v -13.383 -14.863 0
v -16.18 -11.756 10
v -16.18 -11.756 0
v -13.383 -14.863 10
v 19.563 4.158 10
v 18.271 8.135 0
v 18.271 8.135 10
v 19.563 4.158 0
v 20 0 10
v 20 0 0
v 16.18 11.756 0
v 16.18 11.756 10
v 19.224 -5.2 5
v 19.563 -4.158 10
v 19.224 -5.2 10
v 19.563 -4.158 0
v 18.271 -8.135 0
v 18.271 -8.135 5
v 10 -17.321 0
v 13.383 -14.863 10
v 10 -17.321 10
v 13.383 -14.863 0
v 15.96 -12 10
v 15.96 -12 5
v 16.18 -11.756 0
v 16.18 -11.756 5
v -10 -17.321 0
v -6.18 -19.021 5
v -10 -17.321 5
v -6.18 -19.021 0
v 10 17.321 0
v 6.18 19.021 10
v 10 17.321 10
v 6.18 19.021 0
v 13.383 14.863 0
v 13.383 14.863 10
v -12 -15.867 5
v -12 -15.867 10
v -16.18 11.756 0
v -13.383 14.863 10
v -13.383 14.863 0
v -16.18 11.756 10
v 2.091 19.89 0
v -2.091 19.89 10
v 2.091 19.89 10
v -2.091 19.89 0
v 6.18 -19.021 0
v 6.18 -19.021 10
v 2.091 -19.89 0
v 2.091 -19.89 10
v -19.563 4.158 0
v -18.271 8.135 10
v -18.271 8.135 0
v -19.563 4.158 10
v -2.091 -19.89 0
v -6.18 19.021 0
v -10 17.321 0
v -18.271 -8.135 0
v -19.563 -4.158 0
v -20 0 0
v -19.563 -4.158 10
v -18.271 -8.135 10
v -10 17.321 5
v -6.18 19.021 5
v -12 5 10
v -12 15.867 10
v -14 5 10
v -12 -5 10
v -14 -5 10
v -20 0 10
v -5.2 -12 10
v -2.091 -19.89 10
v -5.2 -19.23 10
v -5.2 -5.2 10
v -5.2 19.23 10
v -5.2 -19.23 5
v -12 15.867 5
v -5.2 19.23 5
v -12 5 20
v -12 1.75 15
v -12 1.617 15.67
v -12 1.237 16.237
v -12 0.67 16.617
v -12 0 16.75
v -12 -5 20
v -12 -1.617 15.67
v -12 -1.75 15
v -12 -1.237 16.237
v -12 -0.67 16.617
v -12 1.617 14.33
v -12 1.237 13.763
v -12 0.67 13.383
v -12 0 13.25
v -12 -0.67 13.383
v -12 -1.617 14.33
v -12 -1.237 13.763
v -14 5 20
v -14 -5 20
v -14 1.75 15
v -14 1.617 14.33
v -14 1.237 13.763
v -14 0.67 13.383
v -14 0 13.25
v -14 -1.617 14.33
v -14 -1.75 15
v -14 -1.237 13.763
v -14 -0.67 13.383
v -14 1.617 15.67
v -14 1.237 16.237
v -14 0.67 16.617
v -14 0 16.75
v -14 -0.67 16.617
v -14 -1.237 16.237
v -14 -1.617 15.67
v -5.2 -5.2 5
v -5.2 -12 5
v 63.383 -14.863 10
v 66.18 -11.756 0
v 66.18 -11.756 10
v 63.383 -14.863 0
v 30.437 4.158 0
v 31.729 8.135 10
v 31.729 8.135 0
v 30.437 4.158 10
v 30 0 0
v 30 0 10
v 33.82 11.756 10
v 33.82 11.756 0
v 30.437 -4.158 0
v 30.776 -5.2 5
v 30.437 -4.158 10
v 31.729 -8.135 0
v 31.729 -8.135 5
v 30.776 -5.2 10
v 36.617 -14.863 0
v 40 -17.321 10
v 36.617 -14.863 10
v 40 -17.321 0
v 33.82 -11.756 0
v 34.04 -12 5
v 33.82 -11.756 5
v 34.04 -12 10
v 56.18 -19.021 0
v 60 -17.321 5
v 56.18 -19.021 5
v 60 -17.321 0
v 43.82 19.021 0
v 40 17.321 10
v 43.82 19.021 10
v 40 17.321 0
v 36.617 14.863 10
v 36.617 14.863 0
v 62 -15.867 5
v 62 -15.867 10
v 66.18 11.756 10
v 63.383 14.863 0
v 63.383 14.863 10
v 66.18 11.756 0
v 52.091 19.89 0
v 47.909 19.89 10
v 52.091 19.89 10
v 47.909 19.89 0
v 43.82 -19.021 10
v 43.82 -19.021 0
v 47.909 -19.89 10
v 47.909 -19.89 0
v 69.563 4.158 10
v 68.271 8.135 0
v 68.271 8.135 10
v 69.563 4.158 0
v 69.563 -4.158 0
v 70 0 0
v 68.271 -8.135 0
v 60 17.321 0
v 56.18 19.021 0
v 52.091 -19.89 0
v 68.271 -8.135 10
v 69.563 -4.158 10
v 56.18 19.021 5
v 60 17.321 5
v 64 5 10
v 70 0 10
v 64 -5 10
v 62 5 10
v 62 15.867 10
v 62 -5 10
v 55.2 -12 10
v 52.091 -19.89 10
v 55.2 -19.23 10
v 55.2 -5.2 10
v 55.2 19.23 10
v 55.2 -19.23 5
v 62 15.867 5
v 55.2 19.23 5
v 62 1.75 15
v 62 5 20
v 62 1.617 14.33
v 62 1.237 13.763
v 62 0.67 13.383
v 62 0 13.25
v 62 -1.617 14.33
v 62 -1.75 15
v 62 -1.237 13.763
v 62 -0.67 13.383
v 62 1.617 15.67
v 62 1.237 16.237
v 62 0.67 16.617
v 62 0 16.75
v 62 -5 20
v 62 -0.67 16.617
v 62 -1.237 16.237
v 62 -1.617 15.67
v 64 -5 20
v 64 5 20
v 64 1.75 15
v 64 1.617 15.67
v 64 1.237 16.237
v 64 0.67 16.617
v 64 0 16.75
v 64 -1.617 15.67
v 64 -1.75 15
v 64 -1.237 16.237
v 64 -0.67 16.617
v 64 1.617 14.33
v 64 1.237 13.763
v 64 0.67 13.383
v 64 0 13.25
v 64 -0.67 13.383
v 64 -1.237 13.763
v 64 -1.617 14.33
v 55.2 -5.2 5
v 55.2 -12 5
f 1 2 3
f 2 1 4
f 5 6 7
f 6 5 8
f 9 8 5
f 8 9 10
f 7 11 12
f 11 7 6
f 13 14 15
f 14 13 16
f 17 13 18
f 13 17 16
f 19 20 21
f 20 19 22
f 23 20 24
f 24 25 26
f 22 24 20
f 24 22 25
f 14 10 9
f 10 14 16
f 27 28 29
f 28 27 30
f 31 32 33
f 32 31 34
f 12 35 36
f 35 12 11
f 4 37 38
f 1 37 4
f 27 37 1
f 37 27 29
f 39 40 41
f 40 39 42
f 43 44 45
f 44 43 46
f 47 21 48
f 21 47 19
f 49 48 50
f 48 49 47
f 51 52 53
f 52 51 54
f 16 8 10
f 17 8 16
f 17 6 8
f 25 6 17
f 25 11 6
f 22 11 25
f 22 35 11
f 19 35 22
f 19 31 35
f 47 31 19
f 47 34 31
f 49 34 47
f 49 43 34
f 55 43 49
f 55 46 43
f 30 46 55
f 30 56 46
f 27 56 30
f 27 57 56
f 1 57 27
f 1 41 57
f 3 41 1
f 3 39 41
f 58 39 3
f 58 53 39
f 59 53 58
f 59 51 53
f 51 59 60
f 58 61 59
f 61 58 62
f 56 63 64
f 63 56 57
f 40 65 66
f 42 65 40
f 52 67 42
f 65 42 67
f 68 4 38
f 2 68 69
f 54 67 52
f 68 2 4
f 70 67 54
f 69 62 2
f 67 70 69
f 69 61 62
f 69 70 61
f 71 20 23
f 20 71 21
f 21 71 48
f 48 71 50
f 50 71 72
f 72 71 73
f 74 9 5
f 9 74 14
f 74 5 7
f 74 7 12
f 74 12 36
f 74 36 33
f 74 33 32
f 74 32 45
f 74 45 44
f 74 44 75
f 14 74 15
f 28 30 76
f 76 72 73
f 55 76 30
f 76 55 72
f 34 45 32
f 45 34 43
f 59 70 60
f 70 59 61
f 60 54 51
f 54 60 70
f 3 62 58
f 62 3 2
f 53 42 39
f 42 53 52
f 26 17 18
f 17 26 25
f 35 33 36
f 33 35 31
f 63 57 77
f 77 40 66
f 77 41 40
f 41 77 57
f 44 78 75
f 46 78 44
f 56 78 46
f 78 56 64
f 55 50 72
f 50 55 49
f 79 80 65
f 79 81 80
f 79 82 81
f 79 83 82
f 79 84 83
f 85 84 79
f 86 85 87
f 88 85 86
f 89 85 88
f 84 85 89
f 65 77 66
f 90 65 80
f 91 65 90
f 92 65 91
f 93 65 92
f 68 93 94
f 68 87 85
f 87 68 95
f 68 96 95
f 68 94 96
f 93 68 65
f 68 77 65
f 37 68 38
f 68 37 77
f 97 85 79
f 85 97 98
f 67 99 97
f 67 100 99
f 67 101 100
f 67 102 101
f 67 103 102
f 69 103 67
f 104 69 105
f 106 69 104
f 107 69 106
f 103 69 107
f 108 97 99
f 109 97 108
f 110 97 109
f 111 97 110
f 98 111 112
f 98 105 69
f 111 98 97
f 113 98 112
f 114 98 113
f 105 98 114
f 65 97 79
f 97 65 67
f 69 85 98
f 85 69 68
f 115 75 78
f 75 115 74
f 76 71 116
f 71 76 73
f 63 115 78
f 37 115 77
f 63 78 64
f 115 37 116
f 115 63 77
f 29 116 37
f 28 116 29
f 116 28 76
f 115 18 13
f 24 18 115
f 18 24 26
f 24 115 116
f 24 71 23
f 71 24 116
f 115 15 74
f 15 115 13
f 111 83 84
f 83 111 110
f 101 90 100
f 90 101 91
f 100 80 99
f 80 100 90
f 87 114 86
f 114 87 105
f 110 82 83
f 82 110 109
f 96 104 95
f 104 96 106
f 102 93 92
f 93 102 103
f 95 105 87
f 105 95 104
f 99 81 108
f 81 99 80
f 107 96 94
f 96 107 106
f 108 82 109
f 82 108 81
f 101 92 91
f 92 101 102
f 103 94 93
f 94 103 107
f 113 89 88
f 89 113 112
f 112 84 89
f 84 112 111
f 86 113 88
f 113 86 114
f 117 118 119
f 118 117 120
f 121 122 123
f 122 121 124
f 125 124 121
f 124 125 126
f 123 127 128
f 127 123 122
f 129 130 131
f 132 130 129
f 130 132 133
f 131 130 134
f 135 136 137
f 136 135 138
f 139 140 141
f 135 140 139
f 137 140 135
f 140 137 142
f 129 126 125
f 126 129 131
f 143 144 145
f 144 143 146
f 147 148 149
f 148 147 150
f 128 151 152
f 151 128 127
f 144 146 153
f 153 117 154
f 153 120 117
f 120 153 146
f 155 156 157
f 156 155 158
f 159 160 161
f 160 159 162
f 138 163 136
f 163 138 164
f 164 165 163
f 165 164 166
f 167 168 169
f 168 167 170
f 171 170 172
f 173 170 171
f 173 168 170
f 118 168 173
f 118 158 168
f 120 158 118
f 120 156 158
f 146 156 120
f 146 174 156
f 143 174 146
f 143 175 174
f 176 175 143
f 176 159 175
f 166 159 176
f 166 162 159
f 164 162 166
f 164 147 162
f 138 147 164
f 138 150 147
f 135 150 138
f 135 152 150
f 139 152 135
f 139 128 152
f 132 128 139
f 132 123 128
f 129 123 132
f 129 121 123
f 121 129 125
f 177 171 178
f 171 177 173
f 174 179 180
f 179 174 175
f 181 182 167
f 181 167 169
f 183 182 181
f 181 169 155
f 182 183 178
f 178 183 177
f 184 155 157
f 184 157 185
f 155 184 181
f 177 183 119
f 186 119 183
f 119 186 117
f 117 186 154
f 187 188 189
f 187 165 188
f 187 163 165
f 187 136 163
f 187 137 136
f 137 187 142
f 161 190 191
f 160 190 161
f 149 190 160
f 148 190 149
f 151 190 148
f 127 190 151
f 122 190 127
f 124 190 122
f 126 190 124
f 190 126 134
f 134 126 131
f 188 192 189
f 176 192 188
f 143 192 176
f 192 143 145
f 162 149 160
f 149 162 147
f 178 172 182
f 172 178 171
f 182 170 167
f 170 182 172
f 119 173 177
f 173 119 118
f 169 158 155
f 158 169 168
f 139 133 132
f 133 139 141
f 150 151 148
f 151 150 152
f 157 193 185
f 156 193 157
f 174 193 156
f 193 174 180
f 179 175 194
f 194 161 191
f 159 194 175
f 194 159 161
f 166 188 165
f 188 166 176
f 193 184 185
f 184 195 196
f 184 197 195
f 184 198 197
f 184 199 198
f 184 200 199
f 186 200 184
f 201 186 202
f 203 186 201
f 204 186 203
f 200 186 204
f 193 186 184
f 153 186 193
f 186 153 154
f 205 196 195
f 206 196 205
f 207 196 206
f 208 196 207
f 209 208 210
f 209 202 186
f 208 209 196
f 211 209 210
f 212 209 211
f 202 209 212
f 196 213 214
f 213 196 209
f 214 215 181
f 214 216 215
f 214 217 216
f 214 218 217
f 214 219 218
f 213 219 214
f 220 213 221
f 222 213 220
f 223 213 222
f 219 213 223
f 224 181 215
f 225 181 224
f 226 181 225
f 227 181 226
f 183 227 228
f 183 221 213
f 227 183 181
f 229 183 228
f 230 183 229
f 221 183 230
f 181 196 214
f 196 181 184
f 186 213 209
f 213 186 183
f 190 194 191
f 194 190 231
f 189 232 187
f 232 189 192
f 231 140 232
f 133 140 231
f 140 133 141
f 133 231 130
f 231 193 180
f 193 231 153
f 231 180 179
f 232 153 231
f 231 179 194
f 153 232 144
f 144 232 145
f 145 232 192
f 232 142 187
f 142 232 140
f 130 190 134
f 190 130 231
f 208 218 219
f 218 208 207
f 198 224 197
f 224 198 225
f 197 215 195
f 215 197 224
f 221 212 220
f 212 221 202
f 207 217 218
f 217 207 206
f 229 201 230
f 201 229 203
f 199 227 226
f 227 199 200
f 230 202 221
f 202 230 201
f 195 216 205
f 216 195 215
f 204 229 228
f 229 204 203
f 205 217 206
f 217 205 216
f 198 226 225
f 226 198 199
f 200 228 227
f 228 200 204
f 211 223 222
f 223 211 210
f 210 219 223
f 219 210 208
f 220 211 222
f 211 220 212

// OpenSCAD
// file: ../config.scad
r4 = 2.2;
r8 = 4.2;
r10 = 5.2;

layer_height = 0.25;

switch_d = 9.6;

nema17_r_vis = 15.5;
nema17_r_centre = 11.5;
nema17_h_centre = 2;
nema17_h = 43;
nema17_l = 40;

boite_ui_largeur = 28.5;
boite_ui_l = 46;

support_laser = 24;

r3 = 1.75;
r3_2d = 1.5;
r3_vis = 1.65;
r3_head = 3.6;
m3_r = r3;
m3_nut_d = 7;
m3_nut_d2 = 6.2;
m3_nut_h = 3;

m4_nut_d = 8;
m4_nut_d2 = 7;
m4_nut_h = 4;

608_r = 23/2;
608_h = 8;

laser_printer_l = 609;
laser_printer_lg = 456;

module support_nut(d=3, l_screw1 = 20, l_screw2 = 20, l_nut = 20, h_screw2 = -0.1){
    if(d==3){
        screw_r = r3;
        nut_r = m3_nut_d/2;
        nut_h = m3_nut_h;
        cylinder(nut_h, r = nut_r, $fn = 6, center = true);
        translate([0, 0, -l_screw1])cylinder(l_screw1 +1, r = screw_r);
        translate([0, 0, m3_nut_h/2+ h_screw2])cylinder(l_screw2, r = screw_r);
        l = m3_nut_d*cos(30);
        translate([0, -l/2, -nut_h/2]) cube([l_nut, l,nut_h]);
    } else if(d==4){
        screw_r = r4;
        nut_r = m4_nut_d/2;
        nut_h = m4_nut_h;
        cylinder(nut_h, r = nut_r, $fn = 6, center = true);
        translate([0, 0, -l_screw1])cylinder(l_screw1 +1, r = screw_r);
        translate([0, 0, m4_nut_h/2+ h_screw2])cylinder(l_screw2, r = screw_r);
        l = m4_nut_d*cos(30);
        translate([0, -l/2, -nut_h/2]) cube([l_nut, l,nut_h]);
    }
}


module nut(d=3, center = false){
    nut_r = m3_nut_d/2;
    nut_h = m3_nut_h;
    if(d==3){
        nut_r = m3_nut_d/2;
        nut_h = m3_nut_h;
    } 
    cylinder(nut_h, r = nut_r, $fn = 6, center = center);
}



module m3(h, nut = false, head = false){
    cylinder(h, m3_r, m3_r, $fn=16);
    if(nut){
        cylinder(m3_nut_h, r = m3_nut_d/2, $fn = 6);
    }
}

module m3_nut(h){
    cylinder(m3_nut_h, r = m3_nut_d/2, $fn = 6);
    translate([0, -m3_nut_d2/2, 0]) cube([h, m3_nut_d2, m3_nut_h]);
}

m4_r = 2.3;
m4_nut_d = 8.4;
m4_nut_d2 = 7.5;
m4_nut_h = 3.5;
module m4(h, nut = false, head = false){
    cylinder(h, m4_r, m4_r);
    if(nut){
        cylinder(m4_nut_h, r = m4_nut_d/2, $fn = 6);
    }
}

module m5(h, nut = false, head = false){
    cylinder(h, r = 2.7);
}

m8_nut_d = 15;
m8_nut_d2 = 13;
m8_nut_h = 6.5;
module m8(h, nut = false, head = false){
    cylinder(h, r = r8);
    if(nut){
        cylinder(m8_nut_h, r = m8_nut_d/2, $fn = 6);
    }
}

module cube_arrondi(x, y, z, r=2){
    hull(){
        translate([(x/2-r), (y/2-r), 0]) cylinder(z,r=r);
        translate([(x/2-r), -(y/2-r), 0]) cylinder(z,r=r);
        translate([-(x/2-r), (y/2-r), 0]) cylinder(z,r=r);
        translate([-(x/2-r), -(y/2-r), 0]) cylinder(z,r=r);
    }
}

module demi_glissiere(r, l, h){
    cylinder(h, r, r);
    translate([-r, 0, 0]) cube([r*2, l, h]);
}


module nema17_2d(){
    nema17_l = 43;
    nema17_h = 6;
    polygon([[0,nema17_h], [nema17_h,0]
            , [nema17_l-nema17_h,0],[nema17_l,nema17_h]
            , [nema17_l,nema17_l-nema17_h],[nema17_l-nema17_h,nema17_l]
            , [8,nema17_l],[0,nema17_l-nema17_h] ]);
}

module nema17_2d2(){
    translate([nema17_r_vis, nema17_r_vis] ) circle(r3_2d);
    translate([nema17_r_vis, -nema17_r_vis] ) circle(r3_2d);
    translate([-nema17_r_vis, nema17_r_vis] ) circle(r3_2d);
    translate([-nema17_r_vis, -nema17_r_vis] ) circle(r3_2d);
    circle(nema17_r_centre);
}


module nema17(){
    translate([-nema17_h/2, -nema17_h/2, -nema17_l/2] ) linear_extrude(nema17_l) nema17_2d();
    
    h = nema17_h/2+6;
    translate([nema17_r_vis, nema17_r_vis, 0] )rotate([0, 0, 0]) cylinder(h, r = r3);
    translate([nema17_r_vis, -nema17_r_vis, 0] )rotate([0, 0, 0]) cylinder(h, r = r3);
    translate([-nema17_r_vis, nema17_r_vis, 0] )rotate([0, 0, 0]) cylinder(h, r = r3);
    translate([-nema17_r_vis, -nema17_r_vis, 0] )rotate([0, 0, 0]) cylinder(h, r = r3);
    cylinder(h, nema17_r_centre, nema17_r_centre);
    cylinder(h+14, r = 8);
    
    translate([-8.5, 0, -nema17_l/2] ) cube([17,30, 10]);
}

module corner(l_corner, h_corner, lg_corner){
    translate([0, lg_corner, 0]) rotate([90, 0, 0]) linear_extrude(lg_corner) polygon([[0,0], [l_corner, 0], [0, h_corner]]);
}


/**
 * 2D
 **/

module m3_2d(){
    circle(r3_2d);
}


module cran_x(_l, e, cran, inv){
    difference(){
        square([_l, e]);
        if(inv){
            for(i=[-round(_l/cran):round(_l/cran)]){
                translate([_l/2 + cran/2 - 2*i*cran, -1]) square([cran, e+2]);
            }
        }else{
            for(i=[-round(_l/cran):round(_l/cran)]){
                translate([_l/2 - cran/2 - 2*i*cran, -1]) square([cran, e+2]);
            }
        }
    }
}

module cran_y(_l, e, cran, inv){
    translate([e, 0]) rotate([0, 0, 90]) cran_x(_l, e, cran, inv); 
}

module whole_2d(type_vis){
    if(type_vis == 3){
        circle(1.5);
    } else if(type_vis == 4){
        circle(2);
    } else {
        echo("whole_2d " + type_vis);
    }
}

module nuts_2d(type_vis){
    if(type_vis == 3){
        translate([-1.5, 0])square([3, 20]);
        translate([-5.5/2, 10])square([5.5, 2.5]);
    } else if(type_vis == 4){
        translate([-2, 0])square([4, 30]);
        translate([-7/2, 20])square([7, 3.5]);
    } else {
        echo("nuts_2d " + type_vis);
    }
}

module cran_x_vis(_l, e, cran, type_vis = 3, trous = [0.1, 0.5, 0.9]){
    difference(){
        square([_l, e]);
        for(i=[-round(_l/cran):round(_l/cran)]){
                translate([_l/2 - cran/2 - 2*i*cran, -1]) square([cran, e+2]);
            }
        
    }
    for(i = trous){
        j = round((i-0.5)*_l/(2*cran));
        translate([_l/2  - 2*j*cran, e/2]) whole_2d(type_vis);
    }
}

module cran_x_nuts(_l, e, cran, type_vis = 3, trous = [0.1, 0.5, 0.9]){
    difference(){
        square([_l, e]);
        for(i=[-round(_l/cran):round(_l/cran)]){
                translate([_l/2 + cran/2 - 2*i*cran, -1]) square([cran, e+2]);
        }
    }
    for(i = trous){
        j = round((i-0.5)*_l/(2*cran));
        translate([_l/2  - 2*j*cran, e/2]) nuts_2d(type_vis);
    }
}

module cran_y_vis(_l, e, cran, type_vis = 3, trous = [0.1, 0.5, 0.9]){
    translate([e, 0]) rotate([0, 0, 90]) cran_x_vis(_l, e, cran, type_vis, trous);
}

module cran_y_nuts(_l, e, cran, type_vis = 3, trous = [0.1, 0.5, 0.9]){
    translate([0, _l]) rotate([0, 0, -90]) cran_x_nuts(_l, e, cran, type_vis, trous);
}
// main file
include <../config.scad>

e = 6.8;

module pied(){
    difference(){
        union(){
            cylinder(r=20, 5+5);
            translate([-14, -5, 5])cube([2, 10, 15]);
        }
        translate([-12, -25, 5])cube([e, 50, 50]);
        rotate([0,0,90]) translate([-12, -40, 5])cube([e, 50, 50]);
        translate([-15, 0, 15]) rotate([0,90,0]) m3(10);
    }
}

translate([50,0,0])mirror([1,0,0])pied();
pied();
